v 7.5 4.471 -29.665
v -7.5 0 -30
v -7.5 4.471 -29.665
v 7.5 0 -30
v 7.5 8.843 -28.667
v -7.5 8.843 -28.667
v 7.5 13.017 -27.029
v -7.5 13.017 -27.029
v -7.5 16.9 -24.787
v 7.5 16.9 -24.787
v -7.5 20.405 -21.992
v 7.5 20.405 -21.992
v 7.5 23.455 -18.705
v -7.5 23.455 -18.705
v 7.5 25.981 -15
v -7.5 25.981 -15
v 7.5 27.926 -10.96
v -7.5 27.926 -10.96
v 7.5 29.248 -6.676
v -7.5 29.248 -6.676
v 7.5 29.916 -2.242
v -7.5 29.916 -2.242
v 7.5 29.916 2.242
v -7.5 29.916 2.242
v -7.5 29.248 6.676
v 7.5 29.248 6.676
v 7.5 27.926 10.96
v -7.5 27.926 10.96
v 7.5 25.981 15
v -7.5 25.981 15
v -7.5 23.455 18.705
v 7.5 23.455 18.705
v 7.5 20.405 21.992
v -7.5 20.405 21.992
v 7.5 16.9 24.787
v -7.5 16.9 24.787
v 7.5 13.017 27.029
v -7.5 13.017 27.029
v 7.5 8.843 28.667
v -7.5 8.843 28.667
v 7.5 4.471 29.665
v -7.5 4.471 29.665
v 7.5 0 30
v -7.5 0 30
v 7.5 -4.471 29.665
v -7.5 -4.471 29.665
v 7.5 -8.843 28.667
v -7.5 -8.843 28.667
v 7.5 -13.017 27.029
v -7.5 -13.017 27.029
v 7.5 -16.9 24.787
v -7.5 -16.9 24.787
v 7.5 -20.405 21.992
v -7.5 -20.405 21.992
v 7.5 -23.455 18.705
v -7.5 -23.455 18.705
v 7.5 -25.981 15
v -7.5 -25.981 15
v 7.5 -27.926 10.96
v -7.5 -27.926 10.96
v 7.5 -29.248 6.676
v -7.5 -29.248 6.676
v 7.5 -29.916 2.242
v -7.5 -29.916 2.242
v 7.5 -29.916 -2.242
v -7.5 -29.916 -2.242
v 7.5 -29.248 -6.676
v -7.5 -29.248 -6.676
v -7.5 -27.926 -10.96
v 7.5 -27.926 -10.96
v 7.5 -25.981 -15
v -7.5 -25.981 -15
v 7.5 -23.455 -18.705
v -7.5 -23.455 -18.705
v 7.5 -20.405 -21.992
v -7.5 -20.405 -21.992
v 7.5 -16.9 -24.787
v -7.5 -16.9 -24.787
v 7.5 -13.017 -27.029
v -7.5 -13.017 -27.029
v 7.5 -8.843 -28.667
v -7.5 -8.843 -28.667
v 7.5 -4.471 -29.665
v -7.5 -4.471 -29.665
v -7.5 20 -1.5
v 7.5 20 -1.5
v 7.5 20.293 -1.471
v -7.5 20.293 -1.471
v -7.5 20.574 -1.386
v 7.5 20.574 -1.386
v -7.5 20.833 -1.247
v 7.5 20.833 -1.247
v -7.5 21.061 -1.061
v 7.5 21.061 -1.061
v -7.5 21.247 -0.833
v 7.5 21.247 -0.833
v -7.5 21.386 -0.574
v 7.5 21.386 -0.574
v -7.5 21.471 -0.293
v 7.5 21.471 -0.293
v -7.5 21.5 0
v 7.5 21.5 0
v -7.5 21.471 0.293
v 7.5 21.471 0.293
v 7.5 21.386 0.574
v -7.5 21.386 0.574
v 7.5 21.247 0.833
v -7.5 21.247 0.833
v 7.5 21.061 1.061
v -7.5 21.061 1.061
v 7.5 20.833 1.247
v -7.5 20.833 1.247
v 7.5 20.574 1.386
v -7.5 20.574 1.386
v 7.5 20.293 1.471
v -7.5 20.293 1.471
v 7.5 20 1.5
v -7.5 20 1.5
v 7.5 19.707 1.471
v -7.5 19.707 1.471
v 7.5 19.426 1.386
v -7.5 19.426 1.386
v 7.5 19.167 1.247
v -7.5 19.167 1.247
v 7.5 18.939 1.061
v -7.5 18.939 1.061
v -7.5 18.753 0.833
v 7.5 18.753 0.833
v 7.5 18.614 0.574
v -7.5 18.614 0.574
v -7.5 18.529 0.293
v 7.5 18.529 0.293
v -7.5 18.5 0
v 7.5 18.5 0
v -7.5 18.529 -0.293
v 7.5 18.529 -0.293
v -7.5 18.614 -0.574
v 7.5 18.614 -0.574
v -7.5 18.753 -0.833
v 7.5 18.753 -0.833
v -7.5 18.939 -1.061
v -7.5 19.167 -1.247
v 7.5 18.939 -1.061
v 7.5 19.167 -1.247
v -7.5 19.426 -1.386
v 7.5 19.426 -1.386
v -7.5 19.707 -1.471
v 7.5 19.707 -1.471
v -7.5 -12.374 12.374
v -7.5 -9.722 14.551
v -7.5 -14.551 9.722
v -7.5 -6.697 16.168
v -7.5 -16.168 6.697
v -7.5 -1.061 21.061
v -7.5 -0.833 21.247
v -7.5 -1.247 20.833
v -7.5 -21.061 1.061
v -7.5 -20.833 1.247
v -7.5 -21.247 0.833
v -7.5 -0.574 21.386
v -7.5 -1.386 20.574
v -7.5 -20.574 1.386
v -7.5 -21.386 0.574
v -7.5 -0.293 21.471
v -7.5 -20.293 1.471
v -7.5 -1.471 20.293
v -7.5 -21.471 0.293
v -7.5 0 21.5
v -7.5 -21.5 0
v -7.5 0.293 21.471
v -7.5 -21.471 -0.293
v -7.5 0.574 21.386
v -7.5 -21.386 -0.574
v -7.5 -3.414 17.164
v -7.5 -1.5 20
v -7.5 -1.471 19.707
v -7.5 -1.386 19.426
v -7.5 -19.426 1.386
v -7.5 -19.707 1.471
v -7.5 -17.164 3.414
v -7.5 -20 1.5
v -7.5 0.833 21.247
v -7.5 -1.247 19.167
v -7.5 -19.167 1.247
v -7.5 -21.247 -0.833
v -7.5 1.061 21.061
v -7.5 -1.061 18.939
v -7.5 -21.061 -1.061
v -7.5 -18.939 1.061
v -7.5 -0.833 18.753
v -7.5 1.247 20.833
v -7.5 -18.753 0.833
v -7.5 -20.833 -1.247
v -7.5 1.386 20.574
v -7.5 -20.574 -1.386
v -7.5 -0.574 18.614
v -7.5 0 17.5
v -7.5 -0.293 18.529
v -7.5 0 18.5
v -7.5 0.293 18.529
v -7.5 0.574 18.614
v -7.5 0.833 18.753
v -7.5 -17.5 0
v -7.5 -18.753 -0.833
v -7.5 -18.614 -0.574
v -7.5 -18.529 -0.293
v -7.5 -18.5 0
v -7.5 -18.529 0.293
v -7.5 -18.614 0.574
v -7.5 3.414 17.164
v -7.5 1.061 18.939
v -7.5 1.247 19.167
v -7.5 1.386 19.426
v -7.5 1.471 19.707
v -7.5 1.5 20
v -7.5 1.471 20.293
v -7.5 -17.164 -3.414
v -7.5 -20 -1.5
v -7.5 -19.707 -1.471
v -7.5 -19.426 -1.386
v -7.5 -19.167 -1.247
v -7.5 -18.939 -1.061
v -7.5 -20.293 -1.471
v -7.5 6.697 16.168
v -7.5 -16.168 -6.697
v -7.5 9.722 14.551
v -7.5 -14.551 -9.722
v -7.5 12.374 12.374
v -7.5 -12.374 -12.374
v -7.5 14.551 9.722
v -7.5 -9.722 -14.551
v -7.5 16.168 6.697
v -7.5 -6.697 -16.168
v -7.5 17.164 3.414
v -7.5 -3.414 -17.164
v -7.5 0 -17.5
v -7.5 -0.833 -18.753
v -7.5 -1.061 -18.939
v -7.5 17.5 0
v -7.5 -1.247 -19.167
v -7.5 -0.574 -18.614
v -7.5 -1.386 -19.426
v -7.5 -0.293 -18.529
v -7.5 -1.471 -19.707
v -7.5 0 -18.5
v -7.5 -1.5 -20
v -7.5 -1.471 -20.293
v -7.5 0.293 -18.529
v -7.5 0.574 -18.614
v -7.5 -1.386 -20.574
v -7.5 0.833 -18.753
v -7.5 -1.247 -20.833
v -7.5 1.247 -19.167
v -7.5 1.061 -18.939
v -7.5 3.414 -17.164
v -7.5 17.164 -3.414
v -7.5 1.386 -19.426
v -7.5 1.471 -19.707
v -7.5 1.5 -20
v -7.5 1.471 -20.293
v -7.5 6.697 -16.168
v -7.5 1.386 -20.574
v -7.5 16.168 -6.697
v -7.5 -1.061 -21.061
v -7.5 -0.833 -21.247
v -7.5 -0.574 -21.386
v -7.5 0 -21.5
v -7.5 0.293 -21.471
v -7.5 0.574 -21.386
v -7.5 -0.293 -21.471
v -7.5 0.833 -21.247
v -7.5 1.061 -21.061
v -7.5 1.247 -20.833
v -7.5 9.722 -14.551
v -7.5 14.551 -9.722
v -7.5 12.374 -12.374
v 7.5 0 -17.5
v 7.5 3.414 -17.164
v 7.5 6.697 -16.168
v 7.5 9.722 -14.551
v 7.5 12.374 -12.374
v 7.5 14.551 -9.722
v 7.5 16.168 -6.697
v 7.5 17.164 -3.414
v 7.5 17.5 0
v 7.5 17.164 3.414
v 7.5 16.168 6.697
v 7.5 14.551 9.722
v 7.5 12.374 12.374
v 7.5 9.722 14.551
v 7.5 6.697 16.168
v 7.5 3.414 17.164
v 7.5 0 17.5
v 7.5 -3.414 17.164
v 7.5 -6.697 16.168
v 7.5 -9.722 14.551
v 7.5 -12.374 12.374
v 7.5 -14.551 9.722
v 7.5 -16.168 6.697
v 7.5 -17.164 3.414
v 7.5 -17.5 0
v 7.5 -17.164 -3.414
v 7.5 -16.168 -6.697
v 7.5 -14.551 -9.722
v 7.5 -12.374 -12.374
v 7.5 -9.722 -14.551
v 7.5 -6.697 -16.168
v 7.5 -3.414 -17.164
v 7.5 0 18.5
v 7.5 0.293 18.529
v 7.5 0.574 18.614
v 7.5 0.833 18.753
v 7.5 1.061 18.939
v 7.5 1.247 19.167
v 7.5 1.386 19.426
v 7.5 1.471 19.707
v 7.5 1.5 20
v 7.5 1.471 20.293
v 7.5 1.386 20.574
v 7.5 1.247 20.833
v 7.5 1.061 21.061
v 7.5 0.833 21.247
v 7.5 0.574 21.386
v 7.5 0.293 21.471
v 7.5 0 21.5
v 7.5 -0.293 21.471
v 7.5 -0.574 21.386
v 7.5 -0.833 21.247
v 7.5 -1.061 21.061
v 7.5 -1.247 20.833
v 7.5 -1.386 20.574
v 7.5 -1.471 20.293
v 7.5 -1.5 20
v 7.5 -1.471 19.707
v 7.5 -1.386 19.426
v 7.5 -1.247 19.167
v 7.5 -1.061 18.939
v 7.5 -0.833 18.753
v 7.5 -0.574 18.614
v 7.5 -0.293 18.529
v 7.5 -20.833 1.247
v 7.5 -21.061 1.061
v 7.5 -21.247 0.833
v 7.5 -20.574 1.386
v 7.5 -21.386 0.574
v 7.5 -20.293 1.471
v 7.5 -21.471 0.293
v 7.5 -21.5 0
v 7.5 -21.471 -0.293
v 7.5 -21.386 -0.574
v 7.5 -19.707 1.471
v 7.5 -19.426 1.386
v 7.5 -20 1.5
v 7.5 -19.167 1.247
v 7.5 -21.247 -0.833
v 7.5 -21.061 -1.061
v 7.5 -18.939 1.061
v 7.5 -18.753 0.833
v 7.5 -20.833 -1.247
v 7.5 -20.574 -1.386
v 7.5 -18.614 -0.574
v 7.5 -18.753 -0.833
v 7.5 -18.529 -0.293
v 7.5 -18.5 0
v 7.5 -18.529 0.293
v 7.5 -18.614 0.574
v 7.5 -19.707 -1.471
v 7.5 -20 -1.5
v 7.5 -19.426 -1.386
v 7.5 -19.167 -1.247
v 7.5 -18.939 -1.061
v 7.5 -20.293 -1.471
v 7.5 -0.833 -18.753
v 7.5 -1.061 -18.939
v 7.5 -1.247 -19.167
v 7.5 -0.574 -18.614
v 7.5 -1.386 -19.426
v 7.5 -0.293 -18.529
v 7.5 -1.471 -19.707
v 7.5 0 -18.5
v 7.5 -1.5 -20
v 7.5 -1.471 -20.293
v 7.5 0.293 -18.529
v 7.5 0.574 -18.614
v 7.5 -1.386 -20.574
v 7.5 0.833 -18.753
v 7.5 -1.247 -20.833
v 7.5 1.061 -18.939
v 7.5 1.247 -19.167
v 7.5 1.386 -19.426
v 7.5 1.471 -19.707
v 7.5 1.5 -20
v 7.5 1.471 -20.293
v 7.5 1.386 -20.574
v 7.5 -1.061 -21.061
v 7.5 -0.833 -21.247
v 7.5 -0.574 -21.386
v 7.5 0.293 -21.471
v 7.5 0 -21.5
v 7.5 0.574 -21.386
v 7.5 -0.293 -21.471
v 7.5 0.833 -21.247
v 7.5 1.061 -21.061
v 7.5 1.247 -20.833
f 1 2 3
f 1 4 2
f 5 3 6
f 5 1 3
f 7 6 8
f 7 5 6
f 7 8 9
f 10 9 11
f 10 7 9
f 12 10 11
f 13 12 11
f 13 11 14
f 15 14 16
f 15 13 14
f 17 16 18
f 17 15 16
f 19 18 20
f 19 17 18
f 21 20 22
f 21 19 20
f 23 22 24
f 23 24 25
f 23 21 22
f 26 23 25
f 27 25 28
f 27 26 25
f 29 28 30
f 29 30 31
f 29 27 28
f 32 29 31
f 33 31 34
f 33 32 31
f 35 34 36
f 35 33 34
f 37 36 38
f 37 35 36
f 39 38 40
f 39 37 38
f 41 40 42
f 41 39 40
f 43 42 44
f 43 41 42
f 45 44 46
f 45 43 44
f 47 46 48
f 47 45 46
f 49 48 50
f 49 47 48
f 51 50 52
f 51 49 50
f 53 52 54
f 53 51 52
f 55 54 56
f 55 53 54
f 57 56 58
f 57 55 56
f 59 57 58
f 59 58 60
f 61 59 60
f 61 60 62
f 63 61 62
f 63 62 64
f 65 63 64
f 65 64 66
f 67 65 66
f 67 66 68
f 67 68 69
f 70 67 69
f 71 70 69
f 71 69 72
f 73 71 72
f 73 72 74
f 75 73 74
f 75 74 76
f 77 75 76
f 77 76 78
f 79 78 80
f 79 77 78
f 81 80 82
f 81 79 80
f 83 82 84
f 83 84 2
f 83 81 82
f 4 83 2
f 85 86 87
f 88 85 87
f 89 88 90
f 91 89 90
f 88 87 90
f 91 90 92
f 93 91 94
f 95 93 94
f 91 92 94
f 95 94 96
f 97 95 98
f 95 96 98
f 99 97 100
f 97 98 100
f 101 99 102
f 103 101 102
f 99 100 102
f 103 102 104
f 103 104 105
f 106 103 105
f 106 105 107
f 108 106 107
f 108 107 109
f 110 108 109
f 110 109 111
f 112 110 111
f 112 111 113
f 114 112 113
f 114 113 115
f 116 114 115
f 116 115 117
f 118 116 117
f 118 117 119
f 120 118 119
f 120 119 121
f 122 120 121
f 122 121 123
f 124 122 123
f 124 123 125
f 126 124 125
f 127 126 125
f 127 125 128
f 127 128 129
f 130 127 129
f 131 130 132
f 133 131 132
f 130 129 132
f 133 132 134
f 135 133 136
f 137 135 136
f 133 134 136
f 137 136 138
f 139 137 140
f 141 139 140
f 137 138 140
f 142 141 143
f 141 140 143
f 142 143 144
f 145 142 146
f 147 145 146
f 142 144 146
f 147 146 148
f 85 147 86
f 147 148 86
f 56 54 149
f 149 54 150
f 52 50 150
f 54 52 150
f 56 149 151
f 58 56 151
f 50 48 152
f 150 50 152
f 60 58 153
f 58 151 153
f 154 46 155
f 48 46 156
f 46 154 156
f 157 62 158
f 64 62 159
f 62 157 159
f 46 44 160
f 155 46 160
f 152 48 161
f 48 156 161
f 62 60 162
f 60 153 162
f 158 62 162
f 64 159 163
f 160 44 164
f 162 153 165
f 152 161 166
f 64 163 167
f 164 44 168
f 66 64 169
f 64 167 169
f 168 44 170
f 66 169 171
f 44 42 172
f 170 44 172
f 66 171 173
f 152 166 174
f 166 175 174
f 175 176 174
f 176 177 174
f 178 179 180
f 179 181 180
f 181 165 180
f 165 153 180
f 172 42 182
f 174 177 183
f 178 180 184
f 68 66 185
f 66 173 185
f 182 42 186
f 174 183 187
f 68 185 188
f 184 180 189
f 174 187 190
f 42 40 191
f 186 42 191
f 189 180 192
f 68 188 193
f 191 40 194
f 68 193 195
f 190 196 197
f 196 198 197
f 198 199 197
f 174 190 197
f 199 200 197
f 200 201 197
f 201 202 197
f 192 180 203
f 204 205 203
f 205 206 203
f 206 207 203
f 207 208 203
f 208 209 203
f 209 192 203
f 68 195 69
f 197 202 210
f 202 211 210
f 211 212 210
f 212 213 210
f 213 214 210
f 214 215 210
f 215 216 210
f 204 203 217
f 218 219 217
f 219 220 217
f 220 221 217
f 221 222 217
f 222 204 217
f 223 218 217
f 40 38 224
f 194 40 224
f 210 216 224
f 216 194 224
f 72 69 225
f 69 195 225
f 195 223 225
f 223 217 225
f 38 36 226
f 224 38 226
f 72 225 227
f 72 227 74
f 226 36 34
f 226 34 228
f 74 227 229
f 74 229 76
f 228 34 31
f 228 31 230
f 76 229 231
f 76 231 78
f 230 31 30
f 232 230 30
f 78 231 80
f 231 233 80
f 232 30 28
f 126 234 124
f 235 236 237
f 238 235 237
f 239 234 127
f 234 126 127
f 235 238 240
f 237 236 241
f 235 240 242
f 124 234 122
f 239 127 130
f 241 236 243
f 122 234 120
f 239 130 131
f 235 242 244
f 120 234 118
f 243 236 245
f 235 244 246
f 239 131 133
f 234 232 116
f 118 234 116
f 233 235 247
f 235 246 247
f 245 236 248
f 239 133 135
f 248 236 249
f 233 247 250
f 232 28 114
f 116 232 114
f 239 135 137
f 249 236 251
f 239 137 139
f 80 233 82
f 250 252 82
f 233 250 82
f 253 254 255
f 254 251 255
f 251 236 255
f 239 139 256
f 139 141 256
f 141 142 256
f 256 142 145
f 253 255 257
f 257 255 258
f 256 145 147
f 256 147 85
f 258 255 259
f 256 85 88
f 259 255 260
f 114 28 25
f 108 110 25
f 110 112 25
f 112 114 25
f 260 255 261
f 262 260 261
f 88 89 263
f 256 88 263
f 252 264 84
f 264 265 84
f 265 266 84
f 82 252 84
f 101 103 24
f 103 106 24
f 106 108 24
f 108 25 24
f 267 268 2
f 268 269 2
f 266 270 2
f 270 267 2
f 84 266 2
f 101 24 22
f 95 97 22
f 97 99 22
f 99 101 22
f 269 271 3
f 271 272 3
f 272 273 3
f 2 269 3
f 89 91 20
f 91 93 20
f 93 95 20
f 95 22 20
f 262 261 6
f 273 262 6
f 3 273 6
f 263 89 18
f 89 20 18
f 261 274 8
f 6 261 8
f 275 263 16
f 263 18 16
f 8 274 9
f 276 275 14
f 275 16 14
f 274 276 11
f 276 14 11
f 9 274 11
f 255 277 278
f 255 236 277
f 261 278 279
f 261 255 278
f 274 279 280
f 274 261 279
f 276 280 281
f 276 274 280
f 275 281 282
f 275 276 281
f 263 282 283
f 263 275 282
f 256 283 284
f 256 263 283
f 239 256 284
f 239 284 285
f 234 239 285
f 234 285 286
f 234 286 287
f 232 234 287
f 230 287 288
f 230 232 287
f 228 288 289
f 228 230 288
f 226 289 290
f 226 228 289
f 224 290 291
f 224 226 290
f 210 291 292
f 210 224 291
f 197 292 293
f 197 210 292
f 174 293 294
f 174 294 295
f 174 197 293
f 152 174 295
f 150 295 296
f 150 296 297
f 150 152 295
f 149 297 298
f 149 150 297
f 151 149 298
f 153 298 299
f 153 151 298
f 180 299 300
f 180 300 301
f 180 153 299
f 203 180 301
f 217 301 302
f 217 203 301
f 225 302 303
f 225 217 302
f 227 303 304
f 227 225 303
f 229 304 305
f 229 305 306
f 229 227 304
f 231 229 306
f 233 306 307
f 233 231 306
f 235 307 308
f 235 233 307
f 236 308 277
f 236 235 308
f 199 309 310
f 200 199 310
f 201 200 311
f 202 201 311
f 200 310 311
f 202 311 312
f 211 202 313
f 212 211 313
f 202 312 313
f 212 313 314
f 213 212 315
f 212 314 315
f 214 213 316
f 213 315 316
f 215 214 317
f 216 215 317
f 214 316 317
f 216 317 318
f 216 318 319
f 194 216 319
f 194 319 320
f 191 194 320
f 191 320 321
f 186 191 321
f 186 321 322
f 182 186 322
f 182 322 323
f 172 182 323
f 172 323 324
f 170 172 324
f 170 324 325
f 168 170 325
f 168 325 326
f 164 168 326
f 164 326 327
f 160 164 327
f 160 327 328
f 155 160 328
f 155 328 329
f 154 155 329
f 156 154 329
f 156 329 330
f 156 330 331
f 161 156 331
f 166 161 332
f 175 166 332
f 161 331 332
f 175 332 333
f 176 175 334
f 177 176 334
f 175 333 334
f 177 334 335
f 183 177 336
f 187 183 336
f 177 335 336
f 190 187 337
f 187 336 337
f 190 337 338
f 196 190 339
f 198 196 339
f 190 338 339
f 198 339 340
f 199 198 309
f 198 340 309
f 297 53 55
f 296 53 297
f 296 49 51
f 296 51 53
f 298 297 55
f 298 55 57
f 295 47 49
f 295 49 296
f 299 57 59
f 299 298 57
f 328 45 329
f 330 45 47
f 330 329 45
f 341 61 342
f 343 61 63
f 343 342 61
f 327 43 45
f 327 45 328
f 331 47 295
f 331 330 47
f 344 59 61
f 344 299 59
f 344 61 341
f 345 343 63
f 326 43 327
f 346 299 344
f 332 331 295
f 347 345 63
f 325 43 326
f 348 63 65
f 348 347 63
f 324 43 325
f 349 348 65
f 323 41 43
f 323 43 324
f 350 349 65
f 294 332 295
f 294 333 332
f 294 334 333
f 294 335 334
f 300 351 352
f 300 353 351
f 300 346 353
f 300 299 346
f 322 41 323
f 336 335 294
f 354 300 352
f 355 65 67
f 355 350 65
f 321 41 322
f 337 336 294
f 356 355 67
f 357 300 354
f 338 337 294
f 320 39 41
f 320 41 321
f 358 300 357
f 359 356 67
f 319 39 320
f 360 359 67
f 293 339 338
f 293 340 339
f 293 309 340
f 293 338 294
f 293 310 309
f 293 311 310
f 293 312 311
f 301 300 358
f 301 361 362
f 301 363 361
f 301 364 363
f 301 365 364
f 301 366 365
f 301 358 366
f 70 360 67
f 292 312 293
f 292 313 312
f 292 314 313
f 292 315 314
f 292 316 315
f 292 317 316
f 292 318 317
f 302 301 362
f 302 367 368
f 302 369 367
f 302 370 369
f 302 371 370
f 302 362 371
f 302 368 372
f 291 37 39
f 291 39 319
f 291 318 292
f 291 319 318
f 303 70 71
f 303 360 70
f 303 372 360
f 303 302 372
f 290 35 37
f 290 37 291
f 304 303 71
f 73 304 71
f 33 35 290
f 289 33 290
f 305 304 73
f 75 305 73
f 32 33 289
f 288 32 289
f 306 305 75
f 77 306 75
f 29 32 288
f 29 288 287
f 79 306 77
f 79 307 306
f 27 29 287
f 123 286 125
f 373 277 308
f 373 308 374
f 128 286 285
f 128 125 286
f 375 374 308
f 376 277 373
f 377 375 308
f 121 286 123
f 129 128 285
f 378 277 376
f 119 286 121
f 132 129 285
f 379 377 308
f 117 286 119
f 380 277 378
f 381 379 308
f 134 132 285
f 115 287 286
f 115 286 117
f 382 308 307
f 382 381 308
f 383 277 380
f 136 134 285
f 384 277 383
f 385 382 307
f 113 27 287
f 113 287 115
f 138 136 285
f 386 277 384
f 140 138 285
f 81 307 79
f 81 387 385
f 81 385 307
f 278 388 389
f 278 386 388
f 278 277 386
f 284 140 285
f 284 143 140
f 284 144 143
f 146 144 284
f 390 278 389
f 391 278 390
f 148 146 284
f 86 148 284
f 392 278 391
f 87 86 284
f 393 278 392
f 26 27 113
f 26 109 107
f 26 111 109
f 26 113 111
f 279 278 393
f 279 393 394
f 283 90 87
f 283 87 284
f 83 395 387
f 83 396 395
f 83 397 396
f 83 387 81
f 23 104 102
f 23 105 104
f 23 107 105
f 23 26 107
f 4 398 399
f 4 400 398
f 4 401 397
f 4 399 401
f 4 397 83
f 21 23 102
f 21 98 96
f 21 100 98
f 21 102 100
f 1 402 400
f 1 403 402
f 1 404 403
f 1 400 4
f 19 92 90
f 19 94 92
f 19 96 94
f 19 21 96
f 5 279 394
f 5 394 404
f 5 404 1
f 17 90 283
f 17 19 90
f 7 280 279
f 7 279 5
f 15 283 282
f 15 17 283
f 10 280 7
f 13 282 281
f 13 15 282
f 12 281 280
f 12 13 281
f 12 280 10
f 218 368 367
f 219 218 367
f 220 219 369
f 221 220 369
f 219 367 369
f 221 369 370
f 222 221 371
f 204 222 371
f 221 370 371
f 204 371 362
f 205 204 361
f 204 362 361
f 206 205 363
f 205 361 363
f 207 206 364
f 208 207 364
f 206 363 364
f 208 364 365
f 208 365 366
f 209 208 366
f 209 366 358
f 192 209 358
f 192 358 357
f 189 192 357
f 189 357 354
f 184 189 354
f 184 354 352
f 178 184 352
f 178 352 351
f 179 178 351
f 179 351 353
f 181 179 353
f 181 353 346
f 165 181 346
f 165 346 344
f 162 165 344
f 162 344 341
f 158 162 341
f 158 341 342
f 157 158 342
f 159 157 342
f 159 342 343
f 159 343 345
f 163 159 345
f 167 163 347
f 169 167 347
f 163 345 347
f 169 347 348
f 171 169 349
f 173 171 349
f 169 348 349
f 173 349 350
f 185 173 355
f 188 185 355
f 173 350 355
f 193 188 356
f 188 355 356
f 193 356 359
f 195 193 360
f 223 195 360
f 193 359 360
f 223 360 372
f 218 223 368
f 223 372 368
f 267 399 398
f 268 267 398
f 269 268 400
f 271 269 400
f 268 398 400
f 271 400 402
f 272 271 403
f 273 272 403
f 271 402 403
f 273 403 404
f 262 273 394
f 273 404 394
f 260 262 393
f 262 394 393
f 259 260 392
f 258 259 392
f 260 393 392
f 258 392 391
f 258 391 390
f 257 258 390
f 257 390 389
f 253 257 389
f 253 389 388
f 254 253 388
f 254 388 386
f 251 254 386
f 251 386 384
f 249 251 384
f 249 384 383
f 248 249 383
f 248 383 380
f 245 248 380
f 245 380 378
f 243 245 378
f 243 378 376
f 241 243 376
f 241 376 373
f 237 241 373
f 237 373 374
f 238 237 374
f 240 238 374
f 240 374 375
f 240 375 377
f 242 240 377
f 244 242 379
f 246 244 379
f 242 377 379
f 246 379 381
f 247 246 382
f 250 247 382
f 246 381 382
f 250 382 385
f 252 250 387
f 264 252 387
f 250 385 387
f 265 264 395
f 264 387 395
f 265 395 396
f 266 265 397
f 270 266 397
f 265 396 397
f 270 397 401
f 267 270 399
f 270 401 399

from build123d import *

# Parameters (mm, degrees)
SKETCH1_R           = 30
SKETCH1_R_2         = 17.5
BOSS_EXTRUDE1_DEPTH = 7.5
SKETCH2_R           = 1.5
CUT_EXTRUDE1_DEPTH  = 46


with BuildPart() as part:
    # Sketch1 → Boss-Extrude1 (new, symmetric)
    with BuildSketch(Plane(origin=(0, 0, 0), x_dir=(0, 0, -1), z_dir=(1, 0, 0))):
        Circle(SKETCH1_R)
        Circle(SKETCH1_R_2, mode=Mode.SUBTRACT)
    extrude(amount=BOSS_EXTRUDE1_DEPTH, both=True)

    # Sketch2 → Cut-Extrude1 (cut, through all)
    with BuildSketch(Plane(origin=(7.5, 0, 0), x_dir=(0, 0, -1), z_dir=(1, 0, 0))):
        with Locations((0, 20)):
            Circle(SKETCH2_R)
        with Locations((20, 0)):
            Circle(SKETCH2_R)
        with Locations((0, -20)):
            Circle(SKETCH2_R)
        with Locations((-20, 0)):
            Circle(SKETCH2_R)
    extrude(amount=-CUT_EXTRUDE1_DEPTH, mode=Mode.SUBTRACT)


solid = part.part
